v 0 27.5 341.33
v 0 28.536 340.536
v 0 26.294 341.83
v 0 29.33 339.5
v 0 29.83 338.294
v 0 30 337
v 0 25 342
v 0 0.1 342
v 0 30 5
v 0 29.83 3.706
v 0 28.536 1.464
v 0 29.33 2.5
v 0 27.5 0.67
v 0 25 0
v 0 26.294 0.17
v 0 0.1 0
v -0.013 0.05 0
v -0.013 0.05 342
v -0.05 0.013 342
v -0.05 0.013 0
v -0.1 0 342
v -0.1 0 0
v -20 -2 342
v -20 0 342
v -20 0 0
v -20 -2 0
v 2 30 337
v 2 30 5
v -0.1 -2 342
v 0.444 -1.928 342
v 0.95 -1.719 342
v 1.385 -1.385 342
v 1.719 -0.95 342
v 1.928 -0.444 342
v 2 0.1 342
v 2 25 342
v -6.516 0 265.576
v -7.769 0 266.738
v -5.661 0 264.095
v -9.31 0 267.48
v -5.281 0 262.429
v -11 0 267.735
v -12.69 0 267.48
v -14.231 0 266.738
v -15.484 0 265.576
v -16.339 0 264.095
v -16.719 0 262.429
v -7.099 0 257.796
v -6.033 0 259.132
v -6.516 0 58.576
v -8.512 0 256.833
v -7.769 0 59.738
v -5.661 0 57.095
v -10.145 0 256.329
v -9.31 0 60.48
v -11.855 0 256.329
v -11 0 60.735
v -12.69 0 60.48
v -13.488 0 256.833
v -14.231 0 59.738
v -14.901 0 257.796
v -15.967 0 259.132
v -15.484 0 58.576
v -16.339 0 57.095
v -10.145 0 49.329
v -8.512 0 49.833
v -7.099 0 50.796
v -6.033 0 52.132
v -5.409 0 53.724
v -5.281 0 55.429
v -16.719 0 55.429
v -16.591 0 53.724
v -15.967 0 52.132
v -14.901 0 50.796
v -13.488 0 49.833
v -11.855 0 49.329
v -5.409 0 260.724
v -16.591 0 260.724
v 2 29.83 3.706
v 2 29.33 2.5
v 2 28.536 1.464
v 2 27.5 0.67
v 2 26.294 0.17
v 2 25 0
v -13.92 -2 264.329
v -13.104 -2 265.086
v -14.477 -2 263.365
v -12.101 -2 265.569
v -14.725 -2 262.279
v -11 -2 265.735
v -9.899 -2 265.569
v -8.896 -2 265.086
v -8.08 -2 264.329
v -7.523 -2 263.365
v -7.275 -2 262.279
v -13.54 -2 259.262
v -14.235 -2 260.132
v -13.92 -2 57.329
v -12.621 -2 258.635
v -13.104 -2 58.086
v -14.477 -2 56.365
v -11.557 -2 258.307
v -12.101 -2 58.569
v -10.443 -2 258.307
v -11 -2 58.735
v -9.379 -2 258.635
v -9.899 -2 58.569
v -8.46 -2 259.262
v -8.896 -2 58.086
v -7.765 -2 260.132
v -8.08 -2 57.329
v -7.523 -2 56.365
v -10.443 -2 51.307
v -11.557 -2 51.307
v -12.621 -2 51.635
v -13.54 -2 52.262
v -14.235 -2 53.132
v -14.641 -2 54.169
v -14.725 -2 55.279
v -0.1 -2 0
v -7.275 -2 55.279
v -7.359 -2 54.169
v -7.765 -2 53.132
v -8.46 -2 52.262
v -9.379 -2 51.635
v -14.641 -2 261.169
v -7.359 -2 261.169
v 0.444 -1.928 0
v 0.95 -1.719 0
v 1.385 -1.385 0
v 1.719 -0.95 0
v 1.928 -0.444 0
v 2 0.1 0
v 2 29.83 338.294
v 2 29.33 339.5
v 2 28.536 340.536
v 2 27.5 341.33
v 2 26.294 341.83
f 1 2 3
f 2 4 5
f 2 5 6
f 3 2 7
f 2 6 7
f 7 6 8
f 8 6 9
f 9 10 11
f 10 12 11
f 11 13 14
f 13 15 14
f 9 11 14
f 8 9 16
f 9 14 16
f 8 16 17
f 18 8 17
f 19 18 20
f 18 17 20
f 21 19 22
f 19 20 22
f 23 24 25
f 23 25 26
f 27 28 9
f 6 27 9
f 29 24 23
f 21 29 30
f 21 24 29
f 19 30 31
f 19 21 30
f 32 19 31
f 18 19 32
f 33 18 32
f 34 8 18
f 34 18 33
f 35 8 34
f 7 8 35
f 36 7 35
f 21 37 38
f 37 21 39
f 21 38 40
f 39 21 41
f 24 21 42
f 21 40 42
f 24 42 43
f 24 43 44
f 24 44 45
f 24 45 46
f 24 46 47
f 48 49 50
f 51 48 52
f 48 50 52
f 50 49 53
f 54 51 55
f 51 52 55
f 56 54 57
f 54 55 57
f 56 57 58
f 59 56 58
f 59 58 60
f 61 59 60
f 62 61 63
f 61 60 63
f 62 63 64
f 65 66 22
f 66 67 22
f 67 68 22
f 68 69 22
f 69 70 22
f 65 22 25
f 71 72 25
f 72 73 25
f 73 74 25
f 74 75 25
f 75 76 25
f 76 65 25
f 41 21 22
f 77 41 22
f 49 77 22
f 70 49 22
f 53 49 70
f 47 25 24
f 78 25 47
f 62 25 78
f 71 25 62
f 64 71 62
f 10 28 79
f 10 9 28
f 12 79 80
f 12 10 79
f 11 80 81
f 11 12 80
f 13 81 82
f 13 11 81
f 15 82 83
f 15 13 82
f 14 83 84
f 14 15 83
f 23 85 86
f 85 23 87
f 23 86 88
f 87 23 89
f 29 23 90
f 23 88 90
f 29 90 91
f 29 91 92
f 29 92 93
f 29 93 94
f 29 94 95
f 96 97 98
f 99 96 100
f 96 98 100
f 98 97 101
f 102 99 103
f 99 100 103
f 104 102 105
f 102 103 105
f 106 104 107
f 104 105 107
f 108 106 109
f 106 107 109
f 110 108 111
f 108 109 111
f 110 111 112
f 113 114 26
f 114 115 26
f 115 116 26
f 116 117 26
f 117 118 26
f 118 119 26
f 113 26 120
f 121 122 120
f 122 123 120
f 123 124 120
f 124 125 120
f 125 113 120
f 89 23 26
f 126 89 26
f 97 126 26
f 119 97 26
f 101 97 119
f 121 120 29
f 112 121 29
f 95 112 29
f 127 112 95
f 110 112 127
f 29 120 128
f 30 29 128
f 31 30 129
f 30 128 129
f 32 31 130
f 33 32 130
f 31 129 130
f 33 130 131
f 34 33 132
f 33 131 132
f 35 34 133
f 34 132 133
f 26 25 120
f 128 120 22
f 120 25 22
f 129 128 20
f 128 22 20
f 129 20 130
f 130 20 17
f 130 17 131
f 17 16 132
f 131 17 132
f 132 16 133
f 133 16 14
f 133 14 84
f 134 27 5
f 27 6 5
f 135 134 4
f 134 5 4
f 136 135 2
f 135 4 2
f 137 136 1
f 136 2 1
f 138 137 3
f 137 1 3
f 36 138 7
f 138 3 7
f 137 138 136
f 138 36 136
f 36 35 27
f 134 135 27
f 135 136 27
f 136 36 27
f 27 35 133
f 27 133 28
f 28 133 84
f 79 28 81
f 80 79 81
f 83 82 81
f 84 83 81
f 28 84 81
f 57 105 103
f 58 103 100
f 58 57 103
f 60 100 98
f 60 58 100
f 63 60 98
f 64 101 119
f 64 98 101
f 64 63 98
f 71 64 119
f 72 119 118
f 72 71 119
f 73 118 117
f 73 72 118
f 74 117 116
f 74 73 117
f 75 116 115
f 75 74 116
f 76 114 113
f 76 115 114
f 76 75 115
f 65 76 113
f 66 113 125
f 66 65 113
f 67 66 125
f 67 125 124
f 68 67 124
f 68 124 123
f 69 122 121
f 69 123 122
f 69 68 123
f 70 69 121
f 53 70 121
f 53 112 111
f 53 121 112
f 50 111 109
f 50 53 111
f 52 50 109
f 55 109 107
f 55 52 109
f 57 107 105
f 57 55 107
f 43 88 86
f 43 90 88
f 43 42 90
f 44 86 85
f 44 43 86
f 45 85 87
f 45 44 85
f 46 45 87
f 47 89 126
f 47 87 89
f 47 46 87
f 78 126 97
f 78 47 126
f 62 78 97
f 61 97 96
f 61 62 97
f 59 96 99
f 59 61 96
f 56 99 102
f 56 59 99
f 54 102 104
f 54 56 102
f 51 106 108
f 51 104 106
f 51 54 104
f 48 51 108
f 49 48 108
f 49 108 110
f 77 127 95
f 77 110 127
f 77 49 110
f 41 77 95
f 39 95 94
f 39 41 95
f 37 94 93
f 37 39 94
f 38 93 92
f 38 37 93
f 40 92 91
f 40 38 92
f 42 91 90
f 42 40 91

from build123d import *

# Parameters (mm, degrees)
BASIS_BLECH1_DEPTH                          = 342
VERRUNDUNG1_R                               = 5
FORMSENKUNG_F_R_M5_SENKSCHRAUBE_MIT_2_COUNT = 2
FORMSENKUNG_F_R_M5_SENKSCHRAUBE_MIT_2_PITCH = 207


# Sheet-metal steps are written as plain solids
with BuildPart() as part:
    # Skizze1 → Basis-Blech1 (new body)
    with BuildSketch(Plane.XY):
        with BuildLine():
            Line((0, 30), (0, 0.1))
            ThreePointArc((0, 0.1), (-0.029289322, 0.029289322), (-0.1, 0))
            Line((-0.1, 0), (-20, 0))
            Line((-20, 0), (-20, -2))
            Line((-20, -2), (-0.1, -2))
            ThreePointArc((-0.1, -2), (1.38492424, -1.38492424), (2, 0.1))
            Line((2, 0.1), (2, 30))
            Line((2, 30), (0, 30))
        make_face()
    extrude(amount=BASIS_BLECH1_DEPTH)

    # Verrundung1
    verrundung1_edges = [part.edges().sort_by_distance(p)[0] for p in [
        (1, 30, 342),
        (1, 30, 0),
    ]]
    fillet(verrundung1_edges, radius=VERRUNDUNG1_R)

    # Skizze2 → Formsenkung für M5 Senkschraube mit Innensechskant1 (revolve, cut)
    with BuildSketch(Plane(origin=(-11, 0, 55), x_dir=(0, 0, 1), z_dir=(1, 0, 0))):
        Polygon((0, 0), (0, 2), (2.75, 2), (2.75, 2.985), (5.735, 0), align=None)
    formsenkung_f_r_m5_senkschraube_mit_inne = revolve(axis=Axis((-11, 6.35, 55), (0, -1, 0)), mode=Mode.SUBTRACT)

    # Formsenkung f_r M5 Senkschraube mit  2: Formsenkung für M5 Senkschraube mit Innensechskant1 ×2
    with Locations(*[(0, 0, i * FORMSENKUNG_F_R_M5_SENKSCHRAUBE_MIT_2_PITCH) for i in range(1, FORMSENKUNG_F_R_M5_SENKSCHRAUBE_MIT_2_COUNT)]):
        add(formsenkung_f_r_m5_senkschraube_mit_inne, mode=Mode.SUBTRACT)


solid = part.part
